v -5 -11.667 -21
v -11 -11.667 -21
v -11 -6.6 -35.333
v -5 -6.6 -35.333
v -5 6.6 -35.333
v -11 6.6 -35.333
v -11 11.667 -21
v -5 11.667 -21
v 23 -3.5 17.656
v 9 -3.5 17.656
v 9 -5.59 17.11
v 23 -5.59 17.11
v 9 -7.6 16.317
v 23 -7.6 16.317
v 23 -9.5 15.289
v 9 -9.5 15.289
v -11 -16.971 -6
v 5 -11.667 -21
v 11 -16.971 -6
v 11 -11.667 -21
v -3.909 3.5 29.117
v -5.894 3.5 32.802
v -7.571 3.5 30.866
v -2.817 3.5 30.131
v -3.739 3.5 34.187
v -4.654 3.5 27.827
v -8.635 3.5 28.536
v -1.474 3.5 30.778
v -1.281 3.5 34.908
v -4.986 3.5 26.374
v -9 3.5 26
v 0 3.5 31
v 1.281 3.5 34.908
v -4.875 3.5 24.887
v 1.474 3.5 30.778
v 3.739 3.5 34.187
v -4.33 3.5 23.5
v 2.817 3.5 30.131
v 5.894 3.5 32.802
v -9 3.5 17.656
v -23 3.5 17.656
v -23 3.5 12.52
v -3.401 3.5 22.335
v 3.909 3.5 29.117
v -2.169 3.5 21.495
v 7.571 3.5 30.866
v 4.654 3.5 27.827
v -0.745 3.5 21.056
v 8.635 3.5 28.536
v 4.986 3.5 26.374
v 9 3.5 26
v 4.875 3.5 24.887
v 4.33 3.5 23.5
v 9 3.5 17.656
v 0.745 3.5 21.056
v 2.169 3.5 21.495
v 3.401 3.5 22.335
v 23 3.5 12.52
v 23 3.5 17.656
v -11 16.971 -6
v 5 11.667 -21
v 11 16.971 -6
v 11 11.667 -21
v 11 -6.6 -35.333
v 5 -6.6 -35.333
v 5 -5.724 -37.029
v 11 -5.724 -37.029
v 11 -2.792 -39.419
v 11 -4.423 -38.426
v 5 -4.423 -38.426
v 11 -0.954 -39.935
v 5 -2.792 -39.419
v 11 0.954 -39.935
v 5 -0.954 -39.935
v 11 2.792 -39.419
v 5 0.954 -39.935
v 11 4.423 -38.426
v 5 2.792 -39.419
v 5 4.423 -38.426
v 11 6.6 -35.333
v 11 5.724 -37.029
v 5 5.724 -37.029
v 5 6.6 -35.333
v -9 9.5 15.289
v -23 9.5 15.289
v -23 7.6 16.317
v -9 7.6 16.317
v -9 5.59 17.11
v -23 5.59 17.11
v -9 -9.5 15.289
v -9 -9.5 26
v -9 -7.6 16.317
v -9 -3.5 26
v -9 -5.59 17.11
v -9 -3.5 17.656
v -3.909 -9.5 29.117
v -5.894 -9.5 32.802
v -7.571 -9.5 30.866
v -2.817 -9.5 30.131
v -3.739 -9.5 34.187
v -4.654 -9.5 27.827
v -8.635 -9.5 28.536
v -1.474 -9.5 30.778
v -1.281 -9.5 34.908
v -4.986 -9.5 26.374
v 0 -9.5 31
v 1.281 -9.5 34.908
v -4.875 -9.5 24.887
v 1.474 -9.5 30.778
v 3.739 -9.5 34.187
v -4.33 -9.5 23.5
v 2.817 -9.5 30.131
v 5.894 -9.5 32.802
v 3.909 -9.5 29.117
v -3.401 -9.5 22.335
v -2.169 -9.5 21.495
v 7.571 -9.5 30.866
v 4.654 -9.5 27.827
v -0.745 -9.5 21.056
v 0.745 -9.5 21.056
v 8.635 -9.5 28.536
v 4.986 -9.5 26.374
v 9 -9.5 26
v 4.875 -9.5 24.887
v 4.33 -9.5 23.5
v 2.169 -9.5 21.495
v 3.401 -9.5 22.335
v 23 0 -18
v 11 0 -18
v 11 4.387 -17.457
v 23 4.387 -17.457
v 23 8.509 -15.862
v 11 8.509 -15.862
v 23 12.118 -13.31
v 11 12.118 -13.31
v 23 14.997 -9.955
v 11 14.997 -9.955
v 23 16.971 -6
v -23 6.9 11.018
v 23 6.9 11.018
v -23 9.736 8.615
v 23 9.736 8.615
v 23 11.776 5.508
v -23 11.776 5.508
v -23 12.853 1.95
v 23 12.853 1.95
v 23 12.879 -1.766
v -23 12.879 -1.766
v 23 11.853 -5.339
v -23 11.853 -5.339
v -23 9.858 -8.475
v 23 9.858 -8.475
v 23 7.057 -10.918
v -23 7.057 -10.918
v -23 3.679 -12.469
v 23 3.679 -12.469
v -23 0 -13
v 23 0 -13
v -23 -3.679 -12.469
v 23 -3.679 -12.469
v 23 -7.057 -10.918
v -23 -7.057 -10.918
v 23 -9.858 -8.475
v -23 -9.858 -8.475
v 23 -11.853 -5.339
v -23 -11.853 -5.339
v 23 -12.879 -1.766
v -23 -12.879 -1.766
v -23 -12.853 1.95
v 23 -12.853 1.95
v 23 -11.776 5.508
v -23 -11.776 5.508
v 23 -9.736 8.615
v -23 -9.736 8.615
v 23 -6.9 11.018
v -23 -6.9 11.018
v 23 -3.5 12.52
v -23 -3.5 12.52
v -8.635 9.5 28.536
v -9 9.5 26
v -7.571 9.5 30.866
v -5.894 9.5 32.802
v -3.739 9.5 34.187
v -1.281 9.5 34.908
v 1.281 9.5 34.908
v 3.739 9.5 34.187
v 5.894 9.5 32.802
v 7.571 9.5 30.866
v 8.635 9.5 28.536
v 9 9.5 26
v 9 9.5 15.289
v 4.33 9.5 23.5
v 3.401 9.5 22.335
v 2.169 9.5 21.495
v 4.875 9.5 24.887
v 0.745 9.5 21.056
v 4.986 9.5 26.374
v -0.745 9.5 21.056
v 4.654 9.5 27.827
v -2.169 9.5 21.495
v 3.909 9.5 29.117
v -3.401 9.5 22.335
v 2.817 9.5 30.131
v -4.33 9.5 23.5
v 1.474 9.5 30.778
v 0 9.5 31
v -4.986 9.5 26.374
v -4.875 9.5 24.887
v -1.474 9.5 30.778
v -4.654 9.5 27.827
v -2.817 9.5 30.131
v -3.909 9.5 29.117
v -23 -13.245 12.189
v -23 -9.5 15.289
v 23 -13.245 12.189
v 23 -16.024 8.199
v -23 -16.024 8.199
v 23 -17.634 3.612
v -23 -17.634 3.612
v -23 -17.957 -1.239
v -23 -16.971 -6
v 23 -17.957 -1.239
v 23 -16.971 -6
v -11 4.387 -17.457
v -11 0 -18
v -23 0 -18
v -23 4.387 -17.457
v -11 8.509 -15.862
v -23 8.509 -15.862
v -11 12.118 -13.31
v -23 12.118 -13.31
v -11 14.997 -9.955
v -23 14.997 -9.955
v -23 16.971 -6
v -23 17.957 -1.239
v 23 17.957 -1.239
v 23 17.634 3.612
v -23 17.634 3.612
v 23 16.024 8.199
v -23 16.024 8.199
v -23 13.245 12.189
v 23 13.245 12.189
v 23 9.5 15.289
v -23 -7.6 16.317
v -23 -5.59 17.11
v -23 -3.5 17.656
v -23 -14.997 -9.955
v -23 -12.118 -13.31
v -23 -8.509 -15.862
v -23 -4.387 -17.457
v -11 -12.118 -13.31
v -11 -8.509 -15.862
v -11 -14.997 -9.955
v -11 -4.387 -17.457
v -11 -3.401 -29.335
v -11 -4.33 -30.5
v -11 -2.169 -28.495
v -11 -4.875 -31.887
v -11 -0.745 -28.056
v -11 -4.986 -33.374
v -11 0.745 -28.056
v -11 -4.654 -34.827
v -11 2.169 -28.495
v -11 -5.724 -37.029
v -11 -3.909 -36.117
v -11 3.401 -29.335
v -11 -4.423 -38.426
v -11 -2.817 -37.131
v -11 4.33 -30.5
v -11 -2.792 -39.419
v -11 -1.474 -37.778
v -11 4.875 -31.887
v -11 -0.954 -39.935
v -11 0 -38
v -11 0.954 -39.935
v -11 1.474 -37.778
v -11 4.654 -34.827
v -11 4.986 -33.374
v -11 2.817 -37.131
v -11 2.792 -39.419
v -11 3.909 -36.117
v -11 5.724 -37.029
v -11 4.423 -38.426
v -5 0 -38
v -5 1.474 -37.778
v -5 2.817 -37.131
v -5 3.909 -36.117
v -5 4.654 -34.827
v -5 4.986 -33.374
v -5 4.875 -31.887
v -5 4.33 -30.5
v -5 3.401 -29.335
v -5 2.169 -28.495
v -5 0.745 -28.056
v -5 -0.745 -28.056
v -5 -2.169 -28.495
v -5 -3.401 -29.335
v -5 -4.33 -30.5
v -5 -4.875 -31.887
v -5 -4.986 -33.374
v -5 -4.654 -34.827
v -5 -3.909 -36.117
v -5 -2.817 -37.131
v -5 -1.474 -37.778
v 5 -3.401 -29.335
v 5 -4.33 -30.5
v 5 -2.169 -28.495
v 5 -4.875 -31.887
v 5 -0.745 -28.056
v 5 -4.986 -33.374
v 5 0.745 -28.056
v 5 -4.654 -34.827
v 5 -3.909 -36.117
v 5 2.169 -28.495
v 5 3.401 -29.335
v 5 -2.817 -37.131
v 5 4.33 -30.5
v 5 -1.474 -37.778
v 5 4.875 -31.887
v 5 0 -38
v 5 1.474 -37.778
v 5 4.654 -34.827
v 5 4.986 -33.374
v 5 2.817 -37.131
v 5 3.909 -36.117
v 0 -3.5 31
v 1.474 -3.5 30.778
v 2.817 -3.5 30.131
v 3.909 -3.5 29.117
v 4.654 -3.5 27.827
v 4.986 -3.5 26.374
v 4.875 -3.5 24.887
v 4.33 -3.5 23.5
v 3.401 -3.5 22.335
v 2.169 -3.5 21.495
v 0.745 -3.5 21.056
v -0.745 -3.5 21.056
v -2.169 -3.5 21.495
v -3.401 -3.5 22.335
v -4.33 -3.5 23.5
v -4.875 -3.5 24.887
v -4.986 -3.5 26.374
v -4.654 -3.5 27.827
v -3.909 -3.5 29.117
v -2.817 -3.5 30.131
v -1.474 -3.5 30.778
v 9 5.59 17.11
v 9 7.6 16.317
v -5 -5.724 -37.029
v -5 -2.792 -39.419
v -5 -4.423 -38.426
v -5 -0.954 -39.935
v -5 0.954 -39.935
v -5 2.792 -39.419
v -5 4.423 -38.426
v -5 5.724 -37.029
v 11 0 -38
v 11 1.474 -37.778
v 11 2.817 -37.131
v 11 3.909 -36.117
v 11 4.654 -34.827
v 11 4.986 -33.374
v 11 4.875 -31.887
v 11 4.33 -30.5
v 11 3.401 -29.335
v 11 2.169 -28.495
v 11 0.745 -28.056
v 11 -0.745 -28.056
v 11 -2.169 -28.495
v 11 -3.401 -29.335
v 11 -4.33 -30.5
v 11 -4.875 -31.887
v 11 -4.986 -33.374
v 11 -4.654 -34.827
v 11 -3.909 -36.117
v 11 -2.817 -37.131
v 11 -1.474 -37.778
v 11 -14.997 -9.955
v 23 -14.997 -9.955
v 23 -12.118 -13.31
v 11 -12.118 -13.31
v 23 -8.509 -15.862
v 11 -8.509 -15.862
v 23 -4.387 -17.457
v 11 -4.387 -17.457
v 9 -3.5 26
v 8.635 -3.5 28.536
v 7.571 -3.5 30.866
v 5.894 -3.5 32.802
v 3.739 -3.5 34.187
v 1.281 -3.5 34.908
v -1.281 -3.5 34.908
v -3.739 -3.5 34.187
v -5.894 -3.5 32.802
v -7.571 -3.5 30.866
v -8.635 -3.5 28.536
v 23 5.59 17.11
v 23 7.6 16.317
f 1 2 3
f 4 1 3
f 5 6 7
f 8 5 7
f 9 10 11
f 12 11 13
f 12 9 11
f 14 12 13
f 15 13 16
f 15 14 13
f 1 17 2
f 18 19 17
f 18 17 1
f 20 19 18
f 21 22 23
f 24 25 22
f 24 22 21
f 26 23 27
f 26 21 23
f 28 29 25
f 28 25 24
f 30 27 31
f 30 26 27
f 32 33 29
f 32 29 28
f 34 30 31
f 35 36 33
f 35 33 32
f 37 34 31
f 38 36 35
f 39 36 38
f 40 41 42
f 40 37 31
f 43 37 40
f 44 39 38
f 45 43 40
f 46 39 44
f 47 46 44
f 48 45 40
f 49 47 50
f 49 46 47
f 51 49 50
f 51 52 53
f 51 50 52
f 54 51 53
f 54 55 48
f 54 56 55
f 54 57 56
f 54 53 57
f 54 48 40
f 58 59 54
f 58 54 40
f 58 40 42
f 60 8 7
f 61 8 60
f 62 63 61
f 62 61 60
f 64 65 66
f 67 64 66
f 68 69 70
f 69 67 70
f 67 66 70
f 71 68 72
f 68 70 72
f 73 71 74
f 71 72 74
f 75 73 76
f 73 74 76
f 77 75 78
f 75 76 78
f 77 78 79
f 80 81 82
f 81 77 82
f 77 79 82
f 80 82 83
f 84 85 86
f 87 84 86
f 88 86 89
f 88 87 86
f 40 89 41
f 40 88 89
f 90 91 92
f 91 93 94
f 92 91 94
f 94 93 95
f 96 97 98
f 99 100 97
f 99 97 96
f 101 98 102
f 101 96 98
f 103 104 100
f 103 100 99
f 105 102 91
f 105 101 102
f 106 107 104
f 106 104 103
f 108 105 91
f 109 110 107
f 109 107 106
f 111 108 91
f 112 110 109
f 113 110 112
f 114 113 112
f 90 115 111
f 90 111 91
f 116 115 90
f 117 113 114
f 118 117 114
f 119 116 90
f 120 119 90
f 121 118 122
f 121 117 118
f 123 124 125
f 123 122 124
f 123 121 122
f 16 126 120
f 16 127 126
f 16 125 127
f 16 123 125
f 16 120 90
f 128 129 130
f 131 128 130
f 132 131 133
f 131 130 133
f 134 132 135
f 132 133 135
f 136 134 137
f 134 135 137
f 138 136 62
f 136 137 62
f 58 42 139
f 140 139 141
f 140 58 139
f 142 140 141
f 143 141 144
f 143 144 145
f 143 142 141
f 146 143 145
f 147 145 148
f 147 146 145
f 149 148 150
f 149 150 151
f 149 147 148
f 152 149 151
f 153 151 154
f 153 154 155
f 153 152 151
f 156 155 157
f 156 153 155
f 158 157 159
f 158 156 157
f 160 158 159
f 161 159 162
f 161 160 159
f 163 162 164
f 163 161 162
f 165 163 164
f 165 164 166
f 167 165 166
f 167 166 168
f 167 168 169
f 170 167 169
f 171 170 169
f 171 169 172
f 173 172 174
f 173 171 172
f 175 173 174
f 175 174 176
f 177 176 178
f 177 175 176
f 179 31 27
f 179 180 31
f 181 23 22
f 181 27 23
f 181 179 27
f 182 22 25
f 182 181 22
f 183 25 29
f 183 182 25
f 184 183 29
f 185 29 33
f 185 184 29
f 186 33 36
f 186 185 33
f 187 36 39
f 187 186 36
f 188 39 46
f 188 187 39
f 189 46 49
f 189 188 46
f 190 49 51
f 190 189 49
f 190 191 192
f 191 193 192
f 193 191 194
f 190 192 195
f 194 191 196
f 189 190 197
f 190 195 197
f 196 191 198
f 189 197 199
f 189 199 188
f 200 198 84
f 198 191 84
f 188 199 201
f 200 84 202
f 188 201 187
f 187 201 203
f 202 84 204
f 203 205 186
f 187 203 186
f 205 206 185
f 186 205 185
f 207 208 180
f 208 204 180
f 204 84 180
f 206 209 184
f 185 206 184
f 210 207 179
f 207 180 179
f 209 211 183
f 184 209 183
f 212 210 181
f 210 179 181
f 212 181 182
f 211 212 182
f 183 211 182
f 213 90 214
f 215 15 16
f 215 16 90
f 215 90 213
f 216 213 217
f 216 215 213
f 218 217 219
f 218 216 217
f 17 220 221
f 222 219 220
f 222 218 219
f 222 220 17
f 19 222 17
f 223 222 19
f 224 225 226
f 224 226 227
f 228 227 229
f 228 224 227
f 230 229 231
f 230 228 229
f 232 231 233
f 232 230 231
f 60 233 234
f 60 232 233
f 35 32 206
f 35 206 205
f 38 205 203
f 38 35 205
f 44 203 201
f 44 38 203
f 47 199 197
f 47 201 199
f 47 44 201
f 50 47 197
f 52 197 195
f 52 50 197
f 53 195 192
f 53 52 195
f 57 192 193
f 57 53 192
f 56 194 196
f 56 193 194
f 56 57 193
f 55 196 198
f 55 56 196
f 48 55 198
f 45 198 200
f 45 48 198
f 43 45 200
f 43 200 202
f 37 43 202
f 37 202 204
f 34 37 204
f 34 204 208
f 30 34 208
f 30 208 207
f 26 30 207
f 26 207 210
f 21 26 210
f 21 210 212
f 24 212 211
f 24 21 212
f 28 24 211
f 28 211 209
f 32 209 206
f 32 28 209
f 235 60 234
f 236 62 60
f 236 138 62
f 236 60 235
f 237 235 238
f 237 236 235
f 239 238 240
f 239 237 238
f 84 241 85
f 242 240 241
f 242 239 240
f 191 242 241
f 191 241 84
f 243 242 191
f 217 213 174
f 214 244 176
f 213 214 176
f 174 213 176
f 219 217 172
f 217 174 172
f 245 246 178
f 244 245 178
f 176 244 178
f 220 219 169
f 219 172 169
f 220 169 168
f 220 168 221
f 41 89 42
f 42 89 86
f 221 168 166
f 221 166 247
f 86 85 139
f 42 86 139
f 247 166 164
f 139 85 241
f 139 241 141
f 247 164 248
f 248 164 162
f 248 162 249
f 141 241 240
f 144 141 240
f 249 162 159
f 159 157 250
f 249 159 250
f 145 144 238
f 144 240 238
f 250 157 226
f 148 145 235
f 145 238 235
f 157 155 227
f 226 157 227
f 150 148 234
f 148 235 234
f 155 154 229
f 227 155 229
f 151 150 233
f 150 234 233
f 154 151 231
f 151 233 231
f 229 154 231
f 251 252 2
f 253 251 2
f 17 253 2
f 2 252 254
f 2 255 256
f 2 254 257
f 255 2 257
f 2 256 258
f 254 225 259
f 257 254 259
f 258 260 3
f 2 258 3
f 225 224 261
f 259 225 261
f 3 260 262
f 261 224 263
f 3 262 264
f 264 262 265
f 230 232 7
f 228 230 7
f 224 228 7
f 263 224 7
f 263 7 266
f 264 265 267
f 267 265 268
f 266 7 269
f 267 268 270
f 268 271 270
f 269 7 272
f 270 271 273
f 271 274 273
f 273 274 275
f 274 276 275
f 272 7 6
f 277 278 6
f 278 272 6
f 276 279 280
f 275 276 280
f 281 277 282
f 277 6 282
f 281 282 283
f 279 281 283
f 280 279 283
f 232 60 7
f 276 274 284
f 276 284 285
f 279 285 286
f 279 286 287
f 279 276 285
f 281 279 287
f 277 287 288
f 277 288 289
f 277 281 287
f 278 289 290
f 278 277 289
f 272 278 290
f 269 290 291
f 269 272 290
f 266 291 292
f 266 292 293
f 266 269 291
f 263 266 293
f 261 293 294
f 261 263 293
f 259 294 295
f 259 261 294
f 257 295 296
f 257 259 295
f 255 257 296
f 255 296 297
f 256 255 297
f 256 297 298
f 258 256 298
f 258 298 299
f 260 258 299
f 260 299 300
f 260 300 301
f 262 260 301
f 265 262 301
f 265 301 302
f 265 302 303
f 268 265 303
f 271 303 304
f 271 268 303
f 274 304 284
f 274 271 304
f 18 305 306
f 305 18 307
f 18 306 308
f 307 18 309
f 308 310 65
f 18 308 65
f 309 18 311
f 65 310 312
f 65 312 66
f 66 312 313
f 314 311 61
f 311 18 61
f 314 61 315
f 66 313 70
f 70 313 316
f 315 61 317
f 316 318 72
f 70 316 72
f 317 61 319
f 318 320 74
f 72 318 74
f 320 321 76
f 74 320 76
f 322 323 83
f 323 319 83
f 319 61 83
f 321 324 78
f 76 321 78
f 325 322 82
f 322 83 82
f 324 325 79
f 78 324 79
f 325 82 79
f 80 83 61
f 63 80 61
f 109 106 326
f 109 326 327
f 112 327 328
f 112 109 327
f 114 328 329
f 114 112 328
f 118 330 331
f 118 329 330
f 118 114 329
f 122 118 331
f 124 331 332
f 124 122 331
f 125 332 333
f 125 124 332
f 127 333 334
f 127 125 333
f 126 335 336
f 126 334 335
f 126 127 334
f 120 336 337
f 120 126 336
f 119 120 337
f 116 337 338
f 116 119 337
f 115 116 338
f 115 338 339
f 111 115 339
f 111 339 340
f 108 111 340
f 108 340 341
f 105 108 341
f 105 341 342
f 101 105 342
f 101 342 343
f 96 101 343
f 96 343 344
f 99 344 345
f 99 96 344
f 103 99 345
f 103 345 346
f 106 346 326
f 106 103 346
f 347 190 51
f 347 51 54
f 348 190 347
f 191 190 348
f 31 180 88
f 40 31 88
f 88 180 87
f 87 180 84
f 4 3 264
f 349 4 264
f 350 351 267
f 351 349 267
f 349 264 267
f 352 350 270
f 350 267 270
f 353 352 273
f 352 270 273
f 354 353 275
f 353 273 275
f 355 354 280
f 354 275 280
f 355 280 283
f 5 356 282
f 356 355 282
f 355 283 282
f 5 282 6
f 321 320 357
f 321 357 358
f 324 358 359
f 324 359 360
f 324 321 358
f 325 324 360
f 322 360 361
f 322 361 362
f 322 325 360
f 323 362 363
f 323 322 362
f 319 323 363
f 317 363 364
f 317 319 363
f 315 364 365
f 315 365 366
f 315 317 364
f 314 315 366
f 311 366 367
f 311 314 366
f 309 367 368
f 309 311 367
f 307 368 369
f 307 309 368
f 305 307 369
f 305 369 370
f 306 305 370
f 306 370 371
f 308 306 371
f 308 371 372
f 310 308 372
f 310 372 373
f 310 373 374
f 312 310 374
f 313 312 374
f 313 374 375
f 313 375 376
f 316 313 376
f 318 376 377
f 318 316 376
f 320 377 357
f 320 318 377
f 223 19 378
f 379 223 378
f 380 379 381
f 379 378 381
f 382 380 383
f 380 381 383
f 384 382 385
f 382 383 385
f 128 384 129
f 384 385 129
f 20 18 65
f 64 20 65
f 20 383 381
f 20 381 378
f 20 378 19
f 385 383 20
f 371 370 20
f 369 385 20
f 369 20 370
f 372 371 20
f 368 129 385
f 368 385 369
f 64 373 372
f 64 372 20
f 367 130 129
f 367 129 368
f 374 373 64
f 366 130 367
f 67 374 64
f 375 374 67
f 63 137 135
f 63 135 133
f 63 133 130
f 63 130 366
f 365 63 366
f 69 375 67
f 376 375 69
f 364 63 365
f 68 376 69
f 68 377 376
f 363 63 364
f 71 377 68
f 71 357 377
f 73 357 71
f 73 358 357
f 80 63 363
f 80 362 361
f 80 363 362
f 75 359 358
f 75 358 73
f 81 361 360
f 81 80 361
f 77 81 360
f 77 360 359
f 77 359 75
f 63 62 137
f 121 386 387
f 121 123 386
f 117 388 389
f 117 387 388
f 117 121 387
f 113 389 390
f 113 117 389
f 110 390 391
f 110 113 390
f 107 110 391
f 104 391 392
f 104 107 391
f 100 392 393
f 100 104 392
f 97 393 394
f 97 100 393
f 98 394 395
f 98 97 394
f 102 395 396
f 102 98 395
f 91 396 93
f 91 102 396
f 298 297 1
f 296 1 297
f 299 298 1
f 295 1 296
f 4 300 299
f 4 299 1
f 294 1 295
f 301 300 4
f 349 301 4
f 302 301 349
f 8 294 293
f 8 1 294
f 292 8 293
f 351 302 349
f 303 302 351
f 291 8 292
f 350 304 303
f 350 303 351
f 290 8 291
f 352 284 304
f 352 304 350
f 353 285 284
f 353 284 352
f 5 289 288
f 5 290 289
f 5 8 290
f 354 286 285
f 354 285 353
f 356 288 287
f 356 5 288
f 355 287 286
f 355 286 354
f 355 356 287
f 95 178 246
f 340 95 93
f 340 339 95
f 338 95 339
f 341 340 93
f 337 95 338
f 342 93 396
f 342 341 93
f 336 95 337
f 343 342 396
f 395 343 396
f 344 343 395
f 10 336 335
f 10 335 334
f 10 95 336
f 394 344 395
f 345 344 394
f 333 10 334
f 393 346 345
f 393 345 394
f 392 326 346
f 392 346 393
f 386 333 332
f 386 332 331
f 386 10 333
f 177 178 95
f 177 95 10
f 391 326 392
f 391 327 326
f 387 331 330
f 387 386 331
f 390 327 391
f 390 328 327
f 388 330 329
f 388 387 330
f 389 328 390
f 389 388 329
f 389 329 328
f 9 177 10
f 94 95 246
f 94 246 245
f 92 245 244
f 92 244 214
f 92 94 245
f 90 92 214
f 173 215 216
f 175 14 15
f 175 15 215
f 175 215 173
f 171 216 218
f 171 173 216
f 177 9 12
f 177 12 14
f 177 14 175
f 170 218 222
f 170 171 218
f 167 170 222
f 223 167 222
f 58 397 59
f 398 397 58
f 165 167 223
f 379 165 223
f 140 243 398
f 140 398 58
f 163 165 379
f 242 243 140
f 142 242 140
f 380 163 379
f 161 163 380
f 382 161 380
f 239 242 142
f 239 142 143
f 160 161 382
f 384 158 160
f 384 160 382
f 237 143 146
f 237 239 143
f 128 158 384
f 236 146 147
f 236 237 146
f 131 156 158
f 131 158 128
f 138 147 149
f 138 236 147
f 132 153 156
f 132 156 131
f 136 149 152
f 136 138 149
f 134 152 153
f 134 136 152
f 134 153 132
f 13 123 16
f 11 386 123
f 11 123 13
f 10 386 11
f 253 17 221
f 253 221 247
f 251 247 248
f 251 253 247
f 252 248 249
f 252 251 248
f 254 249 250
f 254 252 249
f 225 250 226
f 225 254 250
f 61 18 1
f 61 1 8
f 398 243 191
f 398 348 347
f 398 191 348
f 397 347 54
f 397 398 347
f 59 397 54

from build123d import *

# Parameters (mm, degrees)
BOSS_EXTRUDE1_DEPTH     = 23
BOSS_EXTRUDE3_DEPTH     = 11
BOSS_EXTRUDE4_START     = 5
SKETCH1_5_R             = 7
SKETCH1_5_R_2           = 5
BOSS_EXTRUDE4_DEPTH     = 6
BOSS_EXTRUDE5_START     = -11
SKETCH1_6_R             = 7
SKETCH1_6_R_2           = 5
BOSS_EXTRUDE5_DEPTH     = 6
BOSS_EXTRUDE6_DEPTH     = 9
FILLET5_RADIUS          = 9
FILLET5_LENGTH          = 6
FILLET6_RADIUS          = 9
FILLET6_LENGTH          = 6
CUT_EXTRUDE1_DEPTH      = 54.714523176
CUT_EXTRUDE1_DEPTH_BACK = 54.714523176
SKETCH3_R               = 5


with BuildPart() as part:
    # Sketch1 → Boss-Extrude1 (new, symmetric)
    with BuildSketch(Plane(origin=(0, 0, 0), x_dir=(0, 0, -1), z_dir=(1, 0, 0))):
        with BuildLine():
            Line((-17.656443583, 3.5), (-12.519984026, 3.5))
            ThreePointArc((-12.519984026, 3.5), (1.766381565, 12.879436951), (13, 0))
            ThreePointArc((13, 0), (1.766381565, -12.879436951), (-12.519984026, -3.5))
            Line((-12.519984026, -3.5), (-17.656443583, -3.5))
            ThreePointArc((-17.656443583, -3.5), (-16.743615691, -6.606915588), (-15.288884851, -9.5))
            ThreePointArc((-15.288884851, -9.5), (-5.96013191, -16.984605607), (6, -16.970562748))
            ThreePointArc((6, -16.970562748), (14.696938457, -10.392304845), (18, 0))
            ThreePointArc((18, 0), (14.696938457, 10.392304845), (6, 16.970562748))
            ThreePointArc((6, 16.970562748), (-5.96013191, 16.984605607), (-15.288884851, 9.5))
            ThreePointArc((-15.288884851, 9.5), (-16.743615691, 6.606915588), (-17.656443583, 3.5))
        make_face()
    extrude(amount=BOSS_EXTRUDE1_DEPTH, both=True)

    # Sketch1<4> → Boss-Extrude3 (add, symmetric)
    with BuildSketch(Plane(origin=(0, 0, 0), x_dir=(0, 0, -1), z_dir=(1, 0, 0))):
        with BuildLine():
            Line((21, 11.66726189), (6, 16.970562748))
            ThreePointArc((6, 16.970562748), (14.696938457, 10.392304845), (18, 0))
            ThreePointArc((18, 0), (14.696938457, -10.392304845), (6, -16.970562748))
            Line((6, -16.970562748), (21, -11.66726189))
            Line((21, -11.66726189), (21, 11.66726189))
        make_face()
    extrude(amount=BOSS_EXTRUDE3_DEPTH, both=True)

    # Sketch1<5> → Boss-Extrude4 (add)
    # profile 1 of 2: a face of its own
    with BuildSketch(Plane(origin=(0, 0, 0), x_dir=(0, 0, -1), z_dir=(1, 0, 0)).offset(BOSS_EXTRUDE4_START)):
        with BuildLine():
            Line((35.333333333, 6.599663291), (21, 11.66726189))
            Line((21, 11.66726189), (21, -11.66726189))
            Line((21, -11.66726189), (35.333333333, -6.599663291))
            ThreePointArc((35.333333333, -6.599663291), (26, 0), (35.333333333, 6.599663291))
        make_face()
    # profile 2 of 2: a face of its own
    with BuildSketch(Plane(origin=(0, 0, 0), x_dir=(0, 0, -1), z_dir=(1, 0, 0)).offset(BOSS_EXTRUDE4_START)):
        with Locations((33, 0)):
            Circle(SKETCH1_5_R)
        with Locations((33, 0)):
            Circle(SKETCH1_5_R_2, mode=Mode.SUBTRACT)
    extrude(amount=BOSS_EXTRUDE4_DEPTH)

    # Sketch1<6> → Boss-Extrude5 (add)
    # profile 1 of 2: a face of its own
    with BuildSketch(Plane(origin=(0, 0, 0), x_dir=(0, 0, -1), z_dir=(1, 0, 0)).offset(BOSS_EXTRUDE5_START)):
        with BuildLine():
            Line((35.333333333, 6.599663291), (21, 11.66726189))
            Line((21, 11.66726189), (21, -11.66726189))
            Line((21, -11.66726189), (35.333333333, -6.599663291))
            ThreePointArc((35.333333333, -6.599663291), (26, 0), (35.333333333, 6.599663291))
        make_face()
    # profile 2 of 2: a face of its own
    with BuildSketch(Plane(origin=(0, 0, 0), x_dir=(0, 0, -1), z_dir=(1, 0, 0)).offset(BOSS_EXTRUDE5_START)):
        with Locations((33, 0)):
            Circle(SKETCH1_6_R)
        with Locations((33, 0)):
            Circle(SKETCH1_6_R_2, mode=Mode.SUBTRACT)
    extrude(amount=BOSS_EXTRUDE5_DEPTH)

    # Sketch1<8> → Boss-Extrude6 (add, symmetric)
    with BuildSketch(Plane(origin=(0, 0, 0), x_dir=(0, 0, -1), z_dir=(1, 0, 0))):
        with BuildLine():
            Line((-35, 3.5), (-17.656443583, 3.5))
            ThreePointArc((-17.656443583, 3.5), (-16.743615691, 6.606915588), (-15.288884851, 9.5))
            Line((-15.288884851, 9.5), (-35, 9.5))
            Line((-35, 9.5), (-35, 3.5))
        make_face()
        with BuildLine():
            ThreePointArc((-15.288884851, -9.5), (-16.743615691, -6.606915588), (-17.656443583, -3.5))
            Line((-17.656443583, -3.5), (-35, -3.5))
            Line((-35, -3.5), (-35, -9.5))
            Line((-35, -9.5), (-15.288884851, -9.5))
        make_face()
    extrude(amount=BOSS_EXTRUDE6_DEPTH, both=True)

    # Fillet5: full round fillet: the end face becomes a half cylinder, R = half its width
    fillet5_face = Plane((0, 6.5, 35), x_dir=(0, 1, 0), z_dir=(0, 0, 1))  # on the end face: x along it, z out of the body
    fillet5_slab = fillet5_face.offset(-FILLET5_RADIUS / 2) * Box(FILLET5_LENGTH, 2 * FILLET5_RADIUS, FILLET5_RADIUS, mode=Mode.PRIVATE)  # the body's end, R deep
    fillet5_round = Plane((0, 6.5, 26), x_dir=(0, 0, 1), z_dir=(0, 1, 0)) * Cylinder(FILLET5_RADIUS, FILLET5_LENGTH, mode=Mode.PRIVATE)  # its axis R under the face
    add(fillet5_slab - fillet5_round, mode=Mode.SUBTRACT)

    # Fillet6: full round fillet: the end face becomes a half cylinder, R = half its width
    fillet6_face = Plane((0, -6.5, 35), x_dir=(0, -1, 0), z_dir=(0, 0, 1))  # on the end face: x along it, z out of the body
    fillet6_slab = fillet6_face.offset(-FILLET6_RADIUS / 2) * Box(FILLET6_LENGTH, 2 * FILLET6_RADIUS, FILLET6_RADIUS, mode=Mode.PRIVATE)  # the body's end, R deep
    fillet6_round = Plane((0, -6.5, 26), x_dir=(0, 0, 1), z_dir=(0, -1, 0)) * Cylinder(FILLET6_RADIUS, FILLET6_LENGTH, mode=Mode.PRIVATE)  # its axis R under the face
    add(fillet6_slab - fillet6_round, mode=Mode.SUBTRACT)

    # Sketch3 → Cut-Extrude1 (cut, two sides: drawn at the far end of the back side and taken through both)
    with BuildSketch(Plane(origin=(0, 9.5, 0), x_dir=(1, 0, 0), z_dir=(0, 1, 0)).offset(-CUT_EXTRUDE1_DEPTH_BACK)):
        with Locations(Location((0, -26, 0), (0, 0, 270))):
            Circle(SKETCH3_R)
    extrude(amount=CUT_EXTRUDE1_DEPTH + CUT_EXTRUDE1_DEPTH_BACK, mode=Mode.SUBTRACT)


solid = part.part
